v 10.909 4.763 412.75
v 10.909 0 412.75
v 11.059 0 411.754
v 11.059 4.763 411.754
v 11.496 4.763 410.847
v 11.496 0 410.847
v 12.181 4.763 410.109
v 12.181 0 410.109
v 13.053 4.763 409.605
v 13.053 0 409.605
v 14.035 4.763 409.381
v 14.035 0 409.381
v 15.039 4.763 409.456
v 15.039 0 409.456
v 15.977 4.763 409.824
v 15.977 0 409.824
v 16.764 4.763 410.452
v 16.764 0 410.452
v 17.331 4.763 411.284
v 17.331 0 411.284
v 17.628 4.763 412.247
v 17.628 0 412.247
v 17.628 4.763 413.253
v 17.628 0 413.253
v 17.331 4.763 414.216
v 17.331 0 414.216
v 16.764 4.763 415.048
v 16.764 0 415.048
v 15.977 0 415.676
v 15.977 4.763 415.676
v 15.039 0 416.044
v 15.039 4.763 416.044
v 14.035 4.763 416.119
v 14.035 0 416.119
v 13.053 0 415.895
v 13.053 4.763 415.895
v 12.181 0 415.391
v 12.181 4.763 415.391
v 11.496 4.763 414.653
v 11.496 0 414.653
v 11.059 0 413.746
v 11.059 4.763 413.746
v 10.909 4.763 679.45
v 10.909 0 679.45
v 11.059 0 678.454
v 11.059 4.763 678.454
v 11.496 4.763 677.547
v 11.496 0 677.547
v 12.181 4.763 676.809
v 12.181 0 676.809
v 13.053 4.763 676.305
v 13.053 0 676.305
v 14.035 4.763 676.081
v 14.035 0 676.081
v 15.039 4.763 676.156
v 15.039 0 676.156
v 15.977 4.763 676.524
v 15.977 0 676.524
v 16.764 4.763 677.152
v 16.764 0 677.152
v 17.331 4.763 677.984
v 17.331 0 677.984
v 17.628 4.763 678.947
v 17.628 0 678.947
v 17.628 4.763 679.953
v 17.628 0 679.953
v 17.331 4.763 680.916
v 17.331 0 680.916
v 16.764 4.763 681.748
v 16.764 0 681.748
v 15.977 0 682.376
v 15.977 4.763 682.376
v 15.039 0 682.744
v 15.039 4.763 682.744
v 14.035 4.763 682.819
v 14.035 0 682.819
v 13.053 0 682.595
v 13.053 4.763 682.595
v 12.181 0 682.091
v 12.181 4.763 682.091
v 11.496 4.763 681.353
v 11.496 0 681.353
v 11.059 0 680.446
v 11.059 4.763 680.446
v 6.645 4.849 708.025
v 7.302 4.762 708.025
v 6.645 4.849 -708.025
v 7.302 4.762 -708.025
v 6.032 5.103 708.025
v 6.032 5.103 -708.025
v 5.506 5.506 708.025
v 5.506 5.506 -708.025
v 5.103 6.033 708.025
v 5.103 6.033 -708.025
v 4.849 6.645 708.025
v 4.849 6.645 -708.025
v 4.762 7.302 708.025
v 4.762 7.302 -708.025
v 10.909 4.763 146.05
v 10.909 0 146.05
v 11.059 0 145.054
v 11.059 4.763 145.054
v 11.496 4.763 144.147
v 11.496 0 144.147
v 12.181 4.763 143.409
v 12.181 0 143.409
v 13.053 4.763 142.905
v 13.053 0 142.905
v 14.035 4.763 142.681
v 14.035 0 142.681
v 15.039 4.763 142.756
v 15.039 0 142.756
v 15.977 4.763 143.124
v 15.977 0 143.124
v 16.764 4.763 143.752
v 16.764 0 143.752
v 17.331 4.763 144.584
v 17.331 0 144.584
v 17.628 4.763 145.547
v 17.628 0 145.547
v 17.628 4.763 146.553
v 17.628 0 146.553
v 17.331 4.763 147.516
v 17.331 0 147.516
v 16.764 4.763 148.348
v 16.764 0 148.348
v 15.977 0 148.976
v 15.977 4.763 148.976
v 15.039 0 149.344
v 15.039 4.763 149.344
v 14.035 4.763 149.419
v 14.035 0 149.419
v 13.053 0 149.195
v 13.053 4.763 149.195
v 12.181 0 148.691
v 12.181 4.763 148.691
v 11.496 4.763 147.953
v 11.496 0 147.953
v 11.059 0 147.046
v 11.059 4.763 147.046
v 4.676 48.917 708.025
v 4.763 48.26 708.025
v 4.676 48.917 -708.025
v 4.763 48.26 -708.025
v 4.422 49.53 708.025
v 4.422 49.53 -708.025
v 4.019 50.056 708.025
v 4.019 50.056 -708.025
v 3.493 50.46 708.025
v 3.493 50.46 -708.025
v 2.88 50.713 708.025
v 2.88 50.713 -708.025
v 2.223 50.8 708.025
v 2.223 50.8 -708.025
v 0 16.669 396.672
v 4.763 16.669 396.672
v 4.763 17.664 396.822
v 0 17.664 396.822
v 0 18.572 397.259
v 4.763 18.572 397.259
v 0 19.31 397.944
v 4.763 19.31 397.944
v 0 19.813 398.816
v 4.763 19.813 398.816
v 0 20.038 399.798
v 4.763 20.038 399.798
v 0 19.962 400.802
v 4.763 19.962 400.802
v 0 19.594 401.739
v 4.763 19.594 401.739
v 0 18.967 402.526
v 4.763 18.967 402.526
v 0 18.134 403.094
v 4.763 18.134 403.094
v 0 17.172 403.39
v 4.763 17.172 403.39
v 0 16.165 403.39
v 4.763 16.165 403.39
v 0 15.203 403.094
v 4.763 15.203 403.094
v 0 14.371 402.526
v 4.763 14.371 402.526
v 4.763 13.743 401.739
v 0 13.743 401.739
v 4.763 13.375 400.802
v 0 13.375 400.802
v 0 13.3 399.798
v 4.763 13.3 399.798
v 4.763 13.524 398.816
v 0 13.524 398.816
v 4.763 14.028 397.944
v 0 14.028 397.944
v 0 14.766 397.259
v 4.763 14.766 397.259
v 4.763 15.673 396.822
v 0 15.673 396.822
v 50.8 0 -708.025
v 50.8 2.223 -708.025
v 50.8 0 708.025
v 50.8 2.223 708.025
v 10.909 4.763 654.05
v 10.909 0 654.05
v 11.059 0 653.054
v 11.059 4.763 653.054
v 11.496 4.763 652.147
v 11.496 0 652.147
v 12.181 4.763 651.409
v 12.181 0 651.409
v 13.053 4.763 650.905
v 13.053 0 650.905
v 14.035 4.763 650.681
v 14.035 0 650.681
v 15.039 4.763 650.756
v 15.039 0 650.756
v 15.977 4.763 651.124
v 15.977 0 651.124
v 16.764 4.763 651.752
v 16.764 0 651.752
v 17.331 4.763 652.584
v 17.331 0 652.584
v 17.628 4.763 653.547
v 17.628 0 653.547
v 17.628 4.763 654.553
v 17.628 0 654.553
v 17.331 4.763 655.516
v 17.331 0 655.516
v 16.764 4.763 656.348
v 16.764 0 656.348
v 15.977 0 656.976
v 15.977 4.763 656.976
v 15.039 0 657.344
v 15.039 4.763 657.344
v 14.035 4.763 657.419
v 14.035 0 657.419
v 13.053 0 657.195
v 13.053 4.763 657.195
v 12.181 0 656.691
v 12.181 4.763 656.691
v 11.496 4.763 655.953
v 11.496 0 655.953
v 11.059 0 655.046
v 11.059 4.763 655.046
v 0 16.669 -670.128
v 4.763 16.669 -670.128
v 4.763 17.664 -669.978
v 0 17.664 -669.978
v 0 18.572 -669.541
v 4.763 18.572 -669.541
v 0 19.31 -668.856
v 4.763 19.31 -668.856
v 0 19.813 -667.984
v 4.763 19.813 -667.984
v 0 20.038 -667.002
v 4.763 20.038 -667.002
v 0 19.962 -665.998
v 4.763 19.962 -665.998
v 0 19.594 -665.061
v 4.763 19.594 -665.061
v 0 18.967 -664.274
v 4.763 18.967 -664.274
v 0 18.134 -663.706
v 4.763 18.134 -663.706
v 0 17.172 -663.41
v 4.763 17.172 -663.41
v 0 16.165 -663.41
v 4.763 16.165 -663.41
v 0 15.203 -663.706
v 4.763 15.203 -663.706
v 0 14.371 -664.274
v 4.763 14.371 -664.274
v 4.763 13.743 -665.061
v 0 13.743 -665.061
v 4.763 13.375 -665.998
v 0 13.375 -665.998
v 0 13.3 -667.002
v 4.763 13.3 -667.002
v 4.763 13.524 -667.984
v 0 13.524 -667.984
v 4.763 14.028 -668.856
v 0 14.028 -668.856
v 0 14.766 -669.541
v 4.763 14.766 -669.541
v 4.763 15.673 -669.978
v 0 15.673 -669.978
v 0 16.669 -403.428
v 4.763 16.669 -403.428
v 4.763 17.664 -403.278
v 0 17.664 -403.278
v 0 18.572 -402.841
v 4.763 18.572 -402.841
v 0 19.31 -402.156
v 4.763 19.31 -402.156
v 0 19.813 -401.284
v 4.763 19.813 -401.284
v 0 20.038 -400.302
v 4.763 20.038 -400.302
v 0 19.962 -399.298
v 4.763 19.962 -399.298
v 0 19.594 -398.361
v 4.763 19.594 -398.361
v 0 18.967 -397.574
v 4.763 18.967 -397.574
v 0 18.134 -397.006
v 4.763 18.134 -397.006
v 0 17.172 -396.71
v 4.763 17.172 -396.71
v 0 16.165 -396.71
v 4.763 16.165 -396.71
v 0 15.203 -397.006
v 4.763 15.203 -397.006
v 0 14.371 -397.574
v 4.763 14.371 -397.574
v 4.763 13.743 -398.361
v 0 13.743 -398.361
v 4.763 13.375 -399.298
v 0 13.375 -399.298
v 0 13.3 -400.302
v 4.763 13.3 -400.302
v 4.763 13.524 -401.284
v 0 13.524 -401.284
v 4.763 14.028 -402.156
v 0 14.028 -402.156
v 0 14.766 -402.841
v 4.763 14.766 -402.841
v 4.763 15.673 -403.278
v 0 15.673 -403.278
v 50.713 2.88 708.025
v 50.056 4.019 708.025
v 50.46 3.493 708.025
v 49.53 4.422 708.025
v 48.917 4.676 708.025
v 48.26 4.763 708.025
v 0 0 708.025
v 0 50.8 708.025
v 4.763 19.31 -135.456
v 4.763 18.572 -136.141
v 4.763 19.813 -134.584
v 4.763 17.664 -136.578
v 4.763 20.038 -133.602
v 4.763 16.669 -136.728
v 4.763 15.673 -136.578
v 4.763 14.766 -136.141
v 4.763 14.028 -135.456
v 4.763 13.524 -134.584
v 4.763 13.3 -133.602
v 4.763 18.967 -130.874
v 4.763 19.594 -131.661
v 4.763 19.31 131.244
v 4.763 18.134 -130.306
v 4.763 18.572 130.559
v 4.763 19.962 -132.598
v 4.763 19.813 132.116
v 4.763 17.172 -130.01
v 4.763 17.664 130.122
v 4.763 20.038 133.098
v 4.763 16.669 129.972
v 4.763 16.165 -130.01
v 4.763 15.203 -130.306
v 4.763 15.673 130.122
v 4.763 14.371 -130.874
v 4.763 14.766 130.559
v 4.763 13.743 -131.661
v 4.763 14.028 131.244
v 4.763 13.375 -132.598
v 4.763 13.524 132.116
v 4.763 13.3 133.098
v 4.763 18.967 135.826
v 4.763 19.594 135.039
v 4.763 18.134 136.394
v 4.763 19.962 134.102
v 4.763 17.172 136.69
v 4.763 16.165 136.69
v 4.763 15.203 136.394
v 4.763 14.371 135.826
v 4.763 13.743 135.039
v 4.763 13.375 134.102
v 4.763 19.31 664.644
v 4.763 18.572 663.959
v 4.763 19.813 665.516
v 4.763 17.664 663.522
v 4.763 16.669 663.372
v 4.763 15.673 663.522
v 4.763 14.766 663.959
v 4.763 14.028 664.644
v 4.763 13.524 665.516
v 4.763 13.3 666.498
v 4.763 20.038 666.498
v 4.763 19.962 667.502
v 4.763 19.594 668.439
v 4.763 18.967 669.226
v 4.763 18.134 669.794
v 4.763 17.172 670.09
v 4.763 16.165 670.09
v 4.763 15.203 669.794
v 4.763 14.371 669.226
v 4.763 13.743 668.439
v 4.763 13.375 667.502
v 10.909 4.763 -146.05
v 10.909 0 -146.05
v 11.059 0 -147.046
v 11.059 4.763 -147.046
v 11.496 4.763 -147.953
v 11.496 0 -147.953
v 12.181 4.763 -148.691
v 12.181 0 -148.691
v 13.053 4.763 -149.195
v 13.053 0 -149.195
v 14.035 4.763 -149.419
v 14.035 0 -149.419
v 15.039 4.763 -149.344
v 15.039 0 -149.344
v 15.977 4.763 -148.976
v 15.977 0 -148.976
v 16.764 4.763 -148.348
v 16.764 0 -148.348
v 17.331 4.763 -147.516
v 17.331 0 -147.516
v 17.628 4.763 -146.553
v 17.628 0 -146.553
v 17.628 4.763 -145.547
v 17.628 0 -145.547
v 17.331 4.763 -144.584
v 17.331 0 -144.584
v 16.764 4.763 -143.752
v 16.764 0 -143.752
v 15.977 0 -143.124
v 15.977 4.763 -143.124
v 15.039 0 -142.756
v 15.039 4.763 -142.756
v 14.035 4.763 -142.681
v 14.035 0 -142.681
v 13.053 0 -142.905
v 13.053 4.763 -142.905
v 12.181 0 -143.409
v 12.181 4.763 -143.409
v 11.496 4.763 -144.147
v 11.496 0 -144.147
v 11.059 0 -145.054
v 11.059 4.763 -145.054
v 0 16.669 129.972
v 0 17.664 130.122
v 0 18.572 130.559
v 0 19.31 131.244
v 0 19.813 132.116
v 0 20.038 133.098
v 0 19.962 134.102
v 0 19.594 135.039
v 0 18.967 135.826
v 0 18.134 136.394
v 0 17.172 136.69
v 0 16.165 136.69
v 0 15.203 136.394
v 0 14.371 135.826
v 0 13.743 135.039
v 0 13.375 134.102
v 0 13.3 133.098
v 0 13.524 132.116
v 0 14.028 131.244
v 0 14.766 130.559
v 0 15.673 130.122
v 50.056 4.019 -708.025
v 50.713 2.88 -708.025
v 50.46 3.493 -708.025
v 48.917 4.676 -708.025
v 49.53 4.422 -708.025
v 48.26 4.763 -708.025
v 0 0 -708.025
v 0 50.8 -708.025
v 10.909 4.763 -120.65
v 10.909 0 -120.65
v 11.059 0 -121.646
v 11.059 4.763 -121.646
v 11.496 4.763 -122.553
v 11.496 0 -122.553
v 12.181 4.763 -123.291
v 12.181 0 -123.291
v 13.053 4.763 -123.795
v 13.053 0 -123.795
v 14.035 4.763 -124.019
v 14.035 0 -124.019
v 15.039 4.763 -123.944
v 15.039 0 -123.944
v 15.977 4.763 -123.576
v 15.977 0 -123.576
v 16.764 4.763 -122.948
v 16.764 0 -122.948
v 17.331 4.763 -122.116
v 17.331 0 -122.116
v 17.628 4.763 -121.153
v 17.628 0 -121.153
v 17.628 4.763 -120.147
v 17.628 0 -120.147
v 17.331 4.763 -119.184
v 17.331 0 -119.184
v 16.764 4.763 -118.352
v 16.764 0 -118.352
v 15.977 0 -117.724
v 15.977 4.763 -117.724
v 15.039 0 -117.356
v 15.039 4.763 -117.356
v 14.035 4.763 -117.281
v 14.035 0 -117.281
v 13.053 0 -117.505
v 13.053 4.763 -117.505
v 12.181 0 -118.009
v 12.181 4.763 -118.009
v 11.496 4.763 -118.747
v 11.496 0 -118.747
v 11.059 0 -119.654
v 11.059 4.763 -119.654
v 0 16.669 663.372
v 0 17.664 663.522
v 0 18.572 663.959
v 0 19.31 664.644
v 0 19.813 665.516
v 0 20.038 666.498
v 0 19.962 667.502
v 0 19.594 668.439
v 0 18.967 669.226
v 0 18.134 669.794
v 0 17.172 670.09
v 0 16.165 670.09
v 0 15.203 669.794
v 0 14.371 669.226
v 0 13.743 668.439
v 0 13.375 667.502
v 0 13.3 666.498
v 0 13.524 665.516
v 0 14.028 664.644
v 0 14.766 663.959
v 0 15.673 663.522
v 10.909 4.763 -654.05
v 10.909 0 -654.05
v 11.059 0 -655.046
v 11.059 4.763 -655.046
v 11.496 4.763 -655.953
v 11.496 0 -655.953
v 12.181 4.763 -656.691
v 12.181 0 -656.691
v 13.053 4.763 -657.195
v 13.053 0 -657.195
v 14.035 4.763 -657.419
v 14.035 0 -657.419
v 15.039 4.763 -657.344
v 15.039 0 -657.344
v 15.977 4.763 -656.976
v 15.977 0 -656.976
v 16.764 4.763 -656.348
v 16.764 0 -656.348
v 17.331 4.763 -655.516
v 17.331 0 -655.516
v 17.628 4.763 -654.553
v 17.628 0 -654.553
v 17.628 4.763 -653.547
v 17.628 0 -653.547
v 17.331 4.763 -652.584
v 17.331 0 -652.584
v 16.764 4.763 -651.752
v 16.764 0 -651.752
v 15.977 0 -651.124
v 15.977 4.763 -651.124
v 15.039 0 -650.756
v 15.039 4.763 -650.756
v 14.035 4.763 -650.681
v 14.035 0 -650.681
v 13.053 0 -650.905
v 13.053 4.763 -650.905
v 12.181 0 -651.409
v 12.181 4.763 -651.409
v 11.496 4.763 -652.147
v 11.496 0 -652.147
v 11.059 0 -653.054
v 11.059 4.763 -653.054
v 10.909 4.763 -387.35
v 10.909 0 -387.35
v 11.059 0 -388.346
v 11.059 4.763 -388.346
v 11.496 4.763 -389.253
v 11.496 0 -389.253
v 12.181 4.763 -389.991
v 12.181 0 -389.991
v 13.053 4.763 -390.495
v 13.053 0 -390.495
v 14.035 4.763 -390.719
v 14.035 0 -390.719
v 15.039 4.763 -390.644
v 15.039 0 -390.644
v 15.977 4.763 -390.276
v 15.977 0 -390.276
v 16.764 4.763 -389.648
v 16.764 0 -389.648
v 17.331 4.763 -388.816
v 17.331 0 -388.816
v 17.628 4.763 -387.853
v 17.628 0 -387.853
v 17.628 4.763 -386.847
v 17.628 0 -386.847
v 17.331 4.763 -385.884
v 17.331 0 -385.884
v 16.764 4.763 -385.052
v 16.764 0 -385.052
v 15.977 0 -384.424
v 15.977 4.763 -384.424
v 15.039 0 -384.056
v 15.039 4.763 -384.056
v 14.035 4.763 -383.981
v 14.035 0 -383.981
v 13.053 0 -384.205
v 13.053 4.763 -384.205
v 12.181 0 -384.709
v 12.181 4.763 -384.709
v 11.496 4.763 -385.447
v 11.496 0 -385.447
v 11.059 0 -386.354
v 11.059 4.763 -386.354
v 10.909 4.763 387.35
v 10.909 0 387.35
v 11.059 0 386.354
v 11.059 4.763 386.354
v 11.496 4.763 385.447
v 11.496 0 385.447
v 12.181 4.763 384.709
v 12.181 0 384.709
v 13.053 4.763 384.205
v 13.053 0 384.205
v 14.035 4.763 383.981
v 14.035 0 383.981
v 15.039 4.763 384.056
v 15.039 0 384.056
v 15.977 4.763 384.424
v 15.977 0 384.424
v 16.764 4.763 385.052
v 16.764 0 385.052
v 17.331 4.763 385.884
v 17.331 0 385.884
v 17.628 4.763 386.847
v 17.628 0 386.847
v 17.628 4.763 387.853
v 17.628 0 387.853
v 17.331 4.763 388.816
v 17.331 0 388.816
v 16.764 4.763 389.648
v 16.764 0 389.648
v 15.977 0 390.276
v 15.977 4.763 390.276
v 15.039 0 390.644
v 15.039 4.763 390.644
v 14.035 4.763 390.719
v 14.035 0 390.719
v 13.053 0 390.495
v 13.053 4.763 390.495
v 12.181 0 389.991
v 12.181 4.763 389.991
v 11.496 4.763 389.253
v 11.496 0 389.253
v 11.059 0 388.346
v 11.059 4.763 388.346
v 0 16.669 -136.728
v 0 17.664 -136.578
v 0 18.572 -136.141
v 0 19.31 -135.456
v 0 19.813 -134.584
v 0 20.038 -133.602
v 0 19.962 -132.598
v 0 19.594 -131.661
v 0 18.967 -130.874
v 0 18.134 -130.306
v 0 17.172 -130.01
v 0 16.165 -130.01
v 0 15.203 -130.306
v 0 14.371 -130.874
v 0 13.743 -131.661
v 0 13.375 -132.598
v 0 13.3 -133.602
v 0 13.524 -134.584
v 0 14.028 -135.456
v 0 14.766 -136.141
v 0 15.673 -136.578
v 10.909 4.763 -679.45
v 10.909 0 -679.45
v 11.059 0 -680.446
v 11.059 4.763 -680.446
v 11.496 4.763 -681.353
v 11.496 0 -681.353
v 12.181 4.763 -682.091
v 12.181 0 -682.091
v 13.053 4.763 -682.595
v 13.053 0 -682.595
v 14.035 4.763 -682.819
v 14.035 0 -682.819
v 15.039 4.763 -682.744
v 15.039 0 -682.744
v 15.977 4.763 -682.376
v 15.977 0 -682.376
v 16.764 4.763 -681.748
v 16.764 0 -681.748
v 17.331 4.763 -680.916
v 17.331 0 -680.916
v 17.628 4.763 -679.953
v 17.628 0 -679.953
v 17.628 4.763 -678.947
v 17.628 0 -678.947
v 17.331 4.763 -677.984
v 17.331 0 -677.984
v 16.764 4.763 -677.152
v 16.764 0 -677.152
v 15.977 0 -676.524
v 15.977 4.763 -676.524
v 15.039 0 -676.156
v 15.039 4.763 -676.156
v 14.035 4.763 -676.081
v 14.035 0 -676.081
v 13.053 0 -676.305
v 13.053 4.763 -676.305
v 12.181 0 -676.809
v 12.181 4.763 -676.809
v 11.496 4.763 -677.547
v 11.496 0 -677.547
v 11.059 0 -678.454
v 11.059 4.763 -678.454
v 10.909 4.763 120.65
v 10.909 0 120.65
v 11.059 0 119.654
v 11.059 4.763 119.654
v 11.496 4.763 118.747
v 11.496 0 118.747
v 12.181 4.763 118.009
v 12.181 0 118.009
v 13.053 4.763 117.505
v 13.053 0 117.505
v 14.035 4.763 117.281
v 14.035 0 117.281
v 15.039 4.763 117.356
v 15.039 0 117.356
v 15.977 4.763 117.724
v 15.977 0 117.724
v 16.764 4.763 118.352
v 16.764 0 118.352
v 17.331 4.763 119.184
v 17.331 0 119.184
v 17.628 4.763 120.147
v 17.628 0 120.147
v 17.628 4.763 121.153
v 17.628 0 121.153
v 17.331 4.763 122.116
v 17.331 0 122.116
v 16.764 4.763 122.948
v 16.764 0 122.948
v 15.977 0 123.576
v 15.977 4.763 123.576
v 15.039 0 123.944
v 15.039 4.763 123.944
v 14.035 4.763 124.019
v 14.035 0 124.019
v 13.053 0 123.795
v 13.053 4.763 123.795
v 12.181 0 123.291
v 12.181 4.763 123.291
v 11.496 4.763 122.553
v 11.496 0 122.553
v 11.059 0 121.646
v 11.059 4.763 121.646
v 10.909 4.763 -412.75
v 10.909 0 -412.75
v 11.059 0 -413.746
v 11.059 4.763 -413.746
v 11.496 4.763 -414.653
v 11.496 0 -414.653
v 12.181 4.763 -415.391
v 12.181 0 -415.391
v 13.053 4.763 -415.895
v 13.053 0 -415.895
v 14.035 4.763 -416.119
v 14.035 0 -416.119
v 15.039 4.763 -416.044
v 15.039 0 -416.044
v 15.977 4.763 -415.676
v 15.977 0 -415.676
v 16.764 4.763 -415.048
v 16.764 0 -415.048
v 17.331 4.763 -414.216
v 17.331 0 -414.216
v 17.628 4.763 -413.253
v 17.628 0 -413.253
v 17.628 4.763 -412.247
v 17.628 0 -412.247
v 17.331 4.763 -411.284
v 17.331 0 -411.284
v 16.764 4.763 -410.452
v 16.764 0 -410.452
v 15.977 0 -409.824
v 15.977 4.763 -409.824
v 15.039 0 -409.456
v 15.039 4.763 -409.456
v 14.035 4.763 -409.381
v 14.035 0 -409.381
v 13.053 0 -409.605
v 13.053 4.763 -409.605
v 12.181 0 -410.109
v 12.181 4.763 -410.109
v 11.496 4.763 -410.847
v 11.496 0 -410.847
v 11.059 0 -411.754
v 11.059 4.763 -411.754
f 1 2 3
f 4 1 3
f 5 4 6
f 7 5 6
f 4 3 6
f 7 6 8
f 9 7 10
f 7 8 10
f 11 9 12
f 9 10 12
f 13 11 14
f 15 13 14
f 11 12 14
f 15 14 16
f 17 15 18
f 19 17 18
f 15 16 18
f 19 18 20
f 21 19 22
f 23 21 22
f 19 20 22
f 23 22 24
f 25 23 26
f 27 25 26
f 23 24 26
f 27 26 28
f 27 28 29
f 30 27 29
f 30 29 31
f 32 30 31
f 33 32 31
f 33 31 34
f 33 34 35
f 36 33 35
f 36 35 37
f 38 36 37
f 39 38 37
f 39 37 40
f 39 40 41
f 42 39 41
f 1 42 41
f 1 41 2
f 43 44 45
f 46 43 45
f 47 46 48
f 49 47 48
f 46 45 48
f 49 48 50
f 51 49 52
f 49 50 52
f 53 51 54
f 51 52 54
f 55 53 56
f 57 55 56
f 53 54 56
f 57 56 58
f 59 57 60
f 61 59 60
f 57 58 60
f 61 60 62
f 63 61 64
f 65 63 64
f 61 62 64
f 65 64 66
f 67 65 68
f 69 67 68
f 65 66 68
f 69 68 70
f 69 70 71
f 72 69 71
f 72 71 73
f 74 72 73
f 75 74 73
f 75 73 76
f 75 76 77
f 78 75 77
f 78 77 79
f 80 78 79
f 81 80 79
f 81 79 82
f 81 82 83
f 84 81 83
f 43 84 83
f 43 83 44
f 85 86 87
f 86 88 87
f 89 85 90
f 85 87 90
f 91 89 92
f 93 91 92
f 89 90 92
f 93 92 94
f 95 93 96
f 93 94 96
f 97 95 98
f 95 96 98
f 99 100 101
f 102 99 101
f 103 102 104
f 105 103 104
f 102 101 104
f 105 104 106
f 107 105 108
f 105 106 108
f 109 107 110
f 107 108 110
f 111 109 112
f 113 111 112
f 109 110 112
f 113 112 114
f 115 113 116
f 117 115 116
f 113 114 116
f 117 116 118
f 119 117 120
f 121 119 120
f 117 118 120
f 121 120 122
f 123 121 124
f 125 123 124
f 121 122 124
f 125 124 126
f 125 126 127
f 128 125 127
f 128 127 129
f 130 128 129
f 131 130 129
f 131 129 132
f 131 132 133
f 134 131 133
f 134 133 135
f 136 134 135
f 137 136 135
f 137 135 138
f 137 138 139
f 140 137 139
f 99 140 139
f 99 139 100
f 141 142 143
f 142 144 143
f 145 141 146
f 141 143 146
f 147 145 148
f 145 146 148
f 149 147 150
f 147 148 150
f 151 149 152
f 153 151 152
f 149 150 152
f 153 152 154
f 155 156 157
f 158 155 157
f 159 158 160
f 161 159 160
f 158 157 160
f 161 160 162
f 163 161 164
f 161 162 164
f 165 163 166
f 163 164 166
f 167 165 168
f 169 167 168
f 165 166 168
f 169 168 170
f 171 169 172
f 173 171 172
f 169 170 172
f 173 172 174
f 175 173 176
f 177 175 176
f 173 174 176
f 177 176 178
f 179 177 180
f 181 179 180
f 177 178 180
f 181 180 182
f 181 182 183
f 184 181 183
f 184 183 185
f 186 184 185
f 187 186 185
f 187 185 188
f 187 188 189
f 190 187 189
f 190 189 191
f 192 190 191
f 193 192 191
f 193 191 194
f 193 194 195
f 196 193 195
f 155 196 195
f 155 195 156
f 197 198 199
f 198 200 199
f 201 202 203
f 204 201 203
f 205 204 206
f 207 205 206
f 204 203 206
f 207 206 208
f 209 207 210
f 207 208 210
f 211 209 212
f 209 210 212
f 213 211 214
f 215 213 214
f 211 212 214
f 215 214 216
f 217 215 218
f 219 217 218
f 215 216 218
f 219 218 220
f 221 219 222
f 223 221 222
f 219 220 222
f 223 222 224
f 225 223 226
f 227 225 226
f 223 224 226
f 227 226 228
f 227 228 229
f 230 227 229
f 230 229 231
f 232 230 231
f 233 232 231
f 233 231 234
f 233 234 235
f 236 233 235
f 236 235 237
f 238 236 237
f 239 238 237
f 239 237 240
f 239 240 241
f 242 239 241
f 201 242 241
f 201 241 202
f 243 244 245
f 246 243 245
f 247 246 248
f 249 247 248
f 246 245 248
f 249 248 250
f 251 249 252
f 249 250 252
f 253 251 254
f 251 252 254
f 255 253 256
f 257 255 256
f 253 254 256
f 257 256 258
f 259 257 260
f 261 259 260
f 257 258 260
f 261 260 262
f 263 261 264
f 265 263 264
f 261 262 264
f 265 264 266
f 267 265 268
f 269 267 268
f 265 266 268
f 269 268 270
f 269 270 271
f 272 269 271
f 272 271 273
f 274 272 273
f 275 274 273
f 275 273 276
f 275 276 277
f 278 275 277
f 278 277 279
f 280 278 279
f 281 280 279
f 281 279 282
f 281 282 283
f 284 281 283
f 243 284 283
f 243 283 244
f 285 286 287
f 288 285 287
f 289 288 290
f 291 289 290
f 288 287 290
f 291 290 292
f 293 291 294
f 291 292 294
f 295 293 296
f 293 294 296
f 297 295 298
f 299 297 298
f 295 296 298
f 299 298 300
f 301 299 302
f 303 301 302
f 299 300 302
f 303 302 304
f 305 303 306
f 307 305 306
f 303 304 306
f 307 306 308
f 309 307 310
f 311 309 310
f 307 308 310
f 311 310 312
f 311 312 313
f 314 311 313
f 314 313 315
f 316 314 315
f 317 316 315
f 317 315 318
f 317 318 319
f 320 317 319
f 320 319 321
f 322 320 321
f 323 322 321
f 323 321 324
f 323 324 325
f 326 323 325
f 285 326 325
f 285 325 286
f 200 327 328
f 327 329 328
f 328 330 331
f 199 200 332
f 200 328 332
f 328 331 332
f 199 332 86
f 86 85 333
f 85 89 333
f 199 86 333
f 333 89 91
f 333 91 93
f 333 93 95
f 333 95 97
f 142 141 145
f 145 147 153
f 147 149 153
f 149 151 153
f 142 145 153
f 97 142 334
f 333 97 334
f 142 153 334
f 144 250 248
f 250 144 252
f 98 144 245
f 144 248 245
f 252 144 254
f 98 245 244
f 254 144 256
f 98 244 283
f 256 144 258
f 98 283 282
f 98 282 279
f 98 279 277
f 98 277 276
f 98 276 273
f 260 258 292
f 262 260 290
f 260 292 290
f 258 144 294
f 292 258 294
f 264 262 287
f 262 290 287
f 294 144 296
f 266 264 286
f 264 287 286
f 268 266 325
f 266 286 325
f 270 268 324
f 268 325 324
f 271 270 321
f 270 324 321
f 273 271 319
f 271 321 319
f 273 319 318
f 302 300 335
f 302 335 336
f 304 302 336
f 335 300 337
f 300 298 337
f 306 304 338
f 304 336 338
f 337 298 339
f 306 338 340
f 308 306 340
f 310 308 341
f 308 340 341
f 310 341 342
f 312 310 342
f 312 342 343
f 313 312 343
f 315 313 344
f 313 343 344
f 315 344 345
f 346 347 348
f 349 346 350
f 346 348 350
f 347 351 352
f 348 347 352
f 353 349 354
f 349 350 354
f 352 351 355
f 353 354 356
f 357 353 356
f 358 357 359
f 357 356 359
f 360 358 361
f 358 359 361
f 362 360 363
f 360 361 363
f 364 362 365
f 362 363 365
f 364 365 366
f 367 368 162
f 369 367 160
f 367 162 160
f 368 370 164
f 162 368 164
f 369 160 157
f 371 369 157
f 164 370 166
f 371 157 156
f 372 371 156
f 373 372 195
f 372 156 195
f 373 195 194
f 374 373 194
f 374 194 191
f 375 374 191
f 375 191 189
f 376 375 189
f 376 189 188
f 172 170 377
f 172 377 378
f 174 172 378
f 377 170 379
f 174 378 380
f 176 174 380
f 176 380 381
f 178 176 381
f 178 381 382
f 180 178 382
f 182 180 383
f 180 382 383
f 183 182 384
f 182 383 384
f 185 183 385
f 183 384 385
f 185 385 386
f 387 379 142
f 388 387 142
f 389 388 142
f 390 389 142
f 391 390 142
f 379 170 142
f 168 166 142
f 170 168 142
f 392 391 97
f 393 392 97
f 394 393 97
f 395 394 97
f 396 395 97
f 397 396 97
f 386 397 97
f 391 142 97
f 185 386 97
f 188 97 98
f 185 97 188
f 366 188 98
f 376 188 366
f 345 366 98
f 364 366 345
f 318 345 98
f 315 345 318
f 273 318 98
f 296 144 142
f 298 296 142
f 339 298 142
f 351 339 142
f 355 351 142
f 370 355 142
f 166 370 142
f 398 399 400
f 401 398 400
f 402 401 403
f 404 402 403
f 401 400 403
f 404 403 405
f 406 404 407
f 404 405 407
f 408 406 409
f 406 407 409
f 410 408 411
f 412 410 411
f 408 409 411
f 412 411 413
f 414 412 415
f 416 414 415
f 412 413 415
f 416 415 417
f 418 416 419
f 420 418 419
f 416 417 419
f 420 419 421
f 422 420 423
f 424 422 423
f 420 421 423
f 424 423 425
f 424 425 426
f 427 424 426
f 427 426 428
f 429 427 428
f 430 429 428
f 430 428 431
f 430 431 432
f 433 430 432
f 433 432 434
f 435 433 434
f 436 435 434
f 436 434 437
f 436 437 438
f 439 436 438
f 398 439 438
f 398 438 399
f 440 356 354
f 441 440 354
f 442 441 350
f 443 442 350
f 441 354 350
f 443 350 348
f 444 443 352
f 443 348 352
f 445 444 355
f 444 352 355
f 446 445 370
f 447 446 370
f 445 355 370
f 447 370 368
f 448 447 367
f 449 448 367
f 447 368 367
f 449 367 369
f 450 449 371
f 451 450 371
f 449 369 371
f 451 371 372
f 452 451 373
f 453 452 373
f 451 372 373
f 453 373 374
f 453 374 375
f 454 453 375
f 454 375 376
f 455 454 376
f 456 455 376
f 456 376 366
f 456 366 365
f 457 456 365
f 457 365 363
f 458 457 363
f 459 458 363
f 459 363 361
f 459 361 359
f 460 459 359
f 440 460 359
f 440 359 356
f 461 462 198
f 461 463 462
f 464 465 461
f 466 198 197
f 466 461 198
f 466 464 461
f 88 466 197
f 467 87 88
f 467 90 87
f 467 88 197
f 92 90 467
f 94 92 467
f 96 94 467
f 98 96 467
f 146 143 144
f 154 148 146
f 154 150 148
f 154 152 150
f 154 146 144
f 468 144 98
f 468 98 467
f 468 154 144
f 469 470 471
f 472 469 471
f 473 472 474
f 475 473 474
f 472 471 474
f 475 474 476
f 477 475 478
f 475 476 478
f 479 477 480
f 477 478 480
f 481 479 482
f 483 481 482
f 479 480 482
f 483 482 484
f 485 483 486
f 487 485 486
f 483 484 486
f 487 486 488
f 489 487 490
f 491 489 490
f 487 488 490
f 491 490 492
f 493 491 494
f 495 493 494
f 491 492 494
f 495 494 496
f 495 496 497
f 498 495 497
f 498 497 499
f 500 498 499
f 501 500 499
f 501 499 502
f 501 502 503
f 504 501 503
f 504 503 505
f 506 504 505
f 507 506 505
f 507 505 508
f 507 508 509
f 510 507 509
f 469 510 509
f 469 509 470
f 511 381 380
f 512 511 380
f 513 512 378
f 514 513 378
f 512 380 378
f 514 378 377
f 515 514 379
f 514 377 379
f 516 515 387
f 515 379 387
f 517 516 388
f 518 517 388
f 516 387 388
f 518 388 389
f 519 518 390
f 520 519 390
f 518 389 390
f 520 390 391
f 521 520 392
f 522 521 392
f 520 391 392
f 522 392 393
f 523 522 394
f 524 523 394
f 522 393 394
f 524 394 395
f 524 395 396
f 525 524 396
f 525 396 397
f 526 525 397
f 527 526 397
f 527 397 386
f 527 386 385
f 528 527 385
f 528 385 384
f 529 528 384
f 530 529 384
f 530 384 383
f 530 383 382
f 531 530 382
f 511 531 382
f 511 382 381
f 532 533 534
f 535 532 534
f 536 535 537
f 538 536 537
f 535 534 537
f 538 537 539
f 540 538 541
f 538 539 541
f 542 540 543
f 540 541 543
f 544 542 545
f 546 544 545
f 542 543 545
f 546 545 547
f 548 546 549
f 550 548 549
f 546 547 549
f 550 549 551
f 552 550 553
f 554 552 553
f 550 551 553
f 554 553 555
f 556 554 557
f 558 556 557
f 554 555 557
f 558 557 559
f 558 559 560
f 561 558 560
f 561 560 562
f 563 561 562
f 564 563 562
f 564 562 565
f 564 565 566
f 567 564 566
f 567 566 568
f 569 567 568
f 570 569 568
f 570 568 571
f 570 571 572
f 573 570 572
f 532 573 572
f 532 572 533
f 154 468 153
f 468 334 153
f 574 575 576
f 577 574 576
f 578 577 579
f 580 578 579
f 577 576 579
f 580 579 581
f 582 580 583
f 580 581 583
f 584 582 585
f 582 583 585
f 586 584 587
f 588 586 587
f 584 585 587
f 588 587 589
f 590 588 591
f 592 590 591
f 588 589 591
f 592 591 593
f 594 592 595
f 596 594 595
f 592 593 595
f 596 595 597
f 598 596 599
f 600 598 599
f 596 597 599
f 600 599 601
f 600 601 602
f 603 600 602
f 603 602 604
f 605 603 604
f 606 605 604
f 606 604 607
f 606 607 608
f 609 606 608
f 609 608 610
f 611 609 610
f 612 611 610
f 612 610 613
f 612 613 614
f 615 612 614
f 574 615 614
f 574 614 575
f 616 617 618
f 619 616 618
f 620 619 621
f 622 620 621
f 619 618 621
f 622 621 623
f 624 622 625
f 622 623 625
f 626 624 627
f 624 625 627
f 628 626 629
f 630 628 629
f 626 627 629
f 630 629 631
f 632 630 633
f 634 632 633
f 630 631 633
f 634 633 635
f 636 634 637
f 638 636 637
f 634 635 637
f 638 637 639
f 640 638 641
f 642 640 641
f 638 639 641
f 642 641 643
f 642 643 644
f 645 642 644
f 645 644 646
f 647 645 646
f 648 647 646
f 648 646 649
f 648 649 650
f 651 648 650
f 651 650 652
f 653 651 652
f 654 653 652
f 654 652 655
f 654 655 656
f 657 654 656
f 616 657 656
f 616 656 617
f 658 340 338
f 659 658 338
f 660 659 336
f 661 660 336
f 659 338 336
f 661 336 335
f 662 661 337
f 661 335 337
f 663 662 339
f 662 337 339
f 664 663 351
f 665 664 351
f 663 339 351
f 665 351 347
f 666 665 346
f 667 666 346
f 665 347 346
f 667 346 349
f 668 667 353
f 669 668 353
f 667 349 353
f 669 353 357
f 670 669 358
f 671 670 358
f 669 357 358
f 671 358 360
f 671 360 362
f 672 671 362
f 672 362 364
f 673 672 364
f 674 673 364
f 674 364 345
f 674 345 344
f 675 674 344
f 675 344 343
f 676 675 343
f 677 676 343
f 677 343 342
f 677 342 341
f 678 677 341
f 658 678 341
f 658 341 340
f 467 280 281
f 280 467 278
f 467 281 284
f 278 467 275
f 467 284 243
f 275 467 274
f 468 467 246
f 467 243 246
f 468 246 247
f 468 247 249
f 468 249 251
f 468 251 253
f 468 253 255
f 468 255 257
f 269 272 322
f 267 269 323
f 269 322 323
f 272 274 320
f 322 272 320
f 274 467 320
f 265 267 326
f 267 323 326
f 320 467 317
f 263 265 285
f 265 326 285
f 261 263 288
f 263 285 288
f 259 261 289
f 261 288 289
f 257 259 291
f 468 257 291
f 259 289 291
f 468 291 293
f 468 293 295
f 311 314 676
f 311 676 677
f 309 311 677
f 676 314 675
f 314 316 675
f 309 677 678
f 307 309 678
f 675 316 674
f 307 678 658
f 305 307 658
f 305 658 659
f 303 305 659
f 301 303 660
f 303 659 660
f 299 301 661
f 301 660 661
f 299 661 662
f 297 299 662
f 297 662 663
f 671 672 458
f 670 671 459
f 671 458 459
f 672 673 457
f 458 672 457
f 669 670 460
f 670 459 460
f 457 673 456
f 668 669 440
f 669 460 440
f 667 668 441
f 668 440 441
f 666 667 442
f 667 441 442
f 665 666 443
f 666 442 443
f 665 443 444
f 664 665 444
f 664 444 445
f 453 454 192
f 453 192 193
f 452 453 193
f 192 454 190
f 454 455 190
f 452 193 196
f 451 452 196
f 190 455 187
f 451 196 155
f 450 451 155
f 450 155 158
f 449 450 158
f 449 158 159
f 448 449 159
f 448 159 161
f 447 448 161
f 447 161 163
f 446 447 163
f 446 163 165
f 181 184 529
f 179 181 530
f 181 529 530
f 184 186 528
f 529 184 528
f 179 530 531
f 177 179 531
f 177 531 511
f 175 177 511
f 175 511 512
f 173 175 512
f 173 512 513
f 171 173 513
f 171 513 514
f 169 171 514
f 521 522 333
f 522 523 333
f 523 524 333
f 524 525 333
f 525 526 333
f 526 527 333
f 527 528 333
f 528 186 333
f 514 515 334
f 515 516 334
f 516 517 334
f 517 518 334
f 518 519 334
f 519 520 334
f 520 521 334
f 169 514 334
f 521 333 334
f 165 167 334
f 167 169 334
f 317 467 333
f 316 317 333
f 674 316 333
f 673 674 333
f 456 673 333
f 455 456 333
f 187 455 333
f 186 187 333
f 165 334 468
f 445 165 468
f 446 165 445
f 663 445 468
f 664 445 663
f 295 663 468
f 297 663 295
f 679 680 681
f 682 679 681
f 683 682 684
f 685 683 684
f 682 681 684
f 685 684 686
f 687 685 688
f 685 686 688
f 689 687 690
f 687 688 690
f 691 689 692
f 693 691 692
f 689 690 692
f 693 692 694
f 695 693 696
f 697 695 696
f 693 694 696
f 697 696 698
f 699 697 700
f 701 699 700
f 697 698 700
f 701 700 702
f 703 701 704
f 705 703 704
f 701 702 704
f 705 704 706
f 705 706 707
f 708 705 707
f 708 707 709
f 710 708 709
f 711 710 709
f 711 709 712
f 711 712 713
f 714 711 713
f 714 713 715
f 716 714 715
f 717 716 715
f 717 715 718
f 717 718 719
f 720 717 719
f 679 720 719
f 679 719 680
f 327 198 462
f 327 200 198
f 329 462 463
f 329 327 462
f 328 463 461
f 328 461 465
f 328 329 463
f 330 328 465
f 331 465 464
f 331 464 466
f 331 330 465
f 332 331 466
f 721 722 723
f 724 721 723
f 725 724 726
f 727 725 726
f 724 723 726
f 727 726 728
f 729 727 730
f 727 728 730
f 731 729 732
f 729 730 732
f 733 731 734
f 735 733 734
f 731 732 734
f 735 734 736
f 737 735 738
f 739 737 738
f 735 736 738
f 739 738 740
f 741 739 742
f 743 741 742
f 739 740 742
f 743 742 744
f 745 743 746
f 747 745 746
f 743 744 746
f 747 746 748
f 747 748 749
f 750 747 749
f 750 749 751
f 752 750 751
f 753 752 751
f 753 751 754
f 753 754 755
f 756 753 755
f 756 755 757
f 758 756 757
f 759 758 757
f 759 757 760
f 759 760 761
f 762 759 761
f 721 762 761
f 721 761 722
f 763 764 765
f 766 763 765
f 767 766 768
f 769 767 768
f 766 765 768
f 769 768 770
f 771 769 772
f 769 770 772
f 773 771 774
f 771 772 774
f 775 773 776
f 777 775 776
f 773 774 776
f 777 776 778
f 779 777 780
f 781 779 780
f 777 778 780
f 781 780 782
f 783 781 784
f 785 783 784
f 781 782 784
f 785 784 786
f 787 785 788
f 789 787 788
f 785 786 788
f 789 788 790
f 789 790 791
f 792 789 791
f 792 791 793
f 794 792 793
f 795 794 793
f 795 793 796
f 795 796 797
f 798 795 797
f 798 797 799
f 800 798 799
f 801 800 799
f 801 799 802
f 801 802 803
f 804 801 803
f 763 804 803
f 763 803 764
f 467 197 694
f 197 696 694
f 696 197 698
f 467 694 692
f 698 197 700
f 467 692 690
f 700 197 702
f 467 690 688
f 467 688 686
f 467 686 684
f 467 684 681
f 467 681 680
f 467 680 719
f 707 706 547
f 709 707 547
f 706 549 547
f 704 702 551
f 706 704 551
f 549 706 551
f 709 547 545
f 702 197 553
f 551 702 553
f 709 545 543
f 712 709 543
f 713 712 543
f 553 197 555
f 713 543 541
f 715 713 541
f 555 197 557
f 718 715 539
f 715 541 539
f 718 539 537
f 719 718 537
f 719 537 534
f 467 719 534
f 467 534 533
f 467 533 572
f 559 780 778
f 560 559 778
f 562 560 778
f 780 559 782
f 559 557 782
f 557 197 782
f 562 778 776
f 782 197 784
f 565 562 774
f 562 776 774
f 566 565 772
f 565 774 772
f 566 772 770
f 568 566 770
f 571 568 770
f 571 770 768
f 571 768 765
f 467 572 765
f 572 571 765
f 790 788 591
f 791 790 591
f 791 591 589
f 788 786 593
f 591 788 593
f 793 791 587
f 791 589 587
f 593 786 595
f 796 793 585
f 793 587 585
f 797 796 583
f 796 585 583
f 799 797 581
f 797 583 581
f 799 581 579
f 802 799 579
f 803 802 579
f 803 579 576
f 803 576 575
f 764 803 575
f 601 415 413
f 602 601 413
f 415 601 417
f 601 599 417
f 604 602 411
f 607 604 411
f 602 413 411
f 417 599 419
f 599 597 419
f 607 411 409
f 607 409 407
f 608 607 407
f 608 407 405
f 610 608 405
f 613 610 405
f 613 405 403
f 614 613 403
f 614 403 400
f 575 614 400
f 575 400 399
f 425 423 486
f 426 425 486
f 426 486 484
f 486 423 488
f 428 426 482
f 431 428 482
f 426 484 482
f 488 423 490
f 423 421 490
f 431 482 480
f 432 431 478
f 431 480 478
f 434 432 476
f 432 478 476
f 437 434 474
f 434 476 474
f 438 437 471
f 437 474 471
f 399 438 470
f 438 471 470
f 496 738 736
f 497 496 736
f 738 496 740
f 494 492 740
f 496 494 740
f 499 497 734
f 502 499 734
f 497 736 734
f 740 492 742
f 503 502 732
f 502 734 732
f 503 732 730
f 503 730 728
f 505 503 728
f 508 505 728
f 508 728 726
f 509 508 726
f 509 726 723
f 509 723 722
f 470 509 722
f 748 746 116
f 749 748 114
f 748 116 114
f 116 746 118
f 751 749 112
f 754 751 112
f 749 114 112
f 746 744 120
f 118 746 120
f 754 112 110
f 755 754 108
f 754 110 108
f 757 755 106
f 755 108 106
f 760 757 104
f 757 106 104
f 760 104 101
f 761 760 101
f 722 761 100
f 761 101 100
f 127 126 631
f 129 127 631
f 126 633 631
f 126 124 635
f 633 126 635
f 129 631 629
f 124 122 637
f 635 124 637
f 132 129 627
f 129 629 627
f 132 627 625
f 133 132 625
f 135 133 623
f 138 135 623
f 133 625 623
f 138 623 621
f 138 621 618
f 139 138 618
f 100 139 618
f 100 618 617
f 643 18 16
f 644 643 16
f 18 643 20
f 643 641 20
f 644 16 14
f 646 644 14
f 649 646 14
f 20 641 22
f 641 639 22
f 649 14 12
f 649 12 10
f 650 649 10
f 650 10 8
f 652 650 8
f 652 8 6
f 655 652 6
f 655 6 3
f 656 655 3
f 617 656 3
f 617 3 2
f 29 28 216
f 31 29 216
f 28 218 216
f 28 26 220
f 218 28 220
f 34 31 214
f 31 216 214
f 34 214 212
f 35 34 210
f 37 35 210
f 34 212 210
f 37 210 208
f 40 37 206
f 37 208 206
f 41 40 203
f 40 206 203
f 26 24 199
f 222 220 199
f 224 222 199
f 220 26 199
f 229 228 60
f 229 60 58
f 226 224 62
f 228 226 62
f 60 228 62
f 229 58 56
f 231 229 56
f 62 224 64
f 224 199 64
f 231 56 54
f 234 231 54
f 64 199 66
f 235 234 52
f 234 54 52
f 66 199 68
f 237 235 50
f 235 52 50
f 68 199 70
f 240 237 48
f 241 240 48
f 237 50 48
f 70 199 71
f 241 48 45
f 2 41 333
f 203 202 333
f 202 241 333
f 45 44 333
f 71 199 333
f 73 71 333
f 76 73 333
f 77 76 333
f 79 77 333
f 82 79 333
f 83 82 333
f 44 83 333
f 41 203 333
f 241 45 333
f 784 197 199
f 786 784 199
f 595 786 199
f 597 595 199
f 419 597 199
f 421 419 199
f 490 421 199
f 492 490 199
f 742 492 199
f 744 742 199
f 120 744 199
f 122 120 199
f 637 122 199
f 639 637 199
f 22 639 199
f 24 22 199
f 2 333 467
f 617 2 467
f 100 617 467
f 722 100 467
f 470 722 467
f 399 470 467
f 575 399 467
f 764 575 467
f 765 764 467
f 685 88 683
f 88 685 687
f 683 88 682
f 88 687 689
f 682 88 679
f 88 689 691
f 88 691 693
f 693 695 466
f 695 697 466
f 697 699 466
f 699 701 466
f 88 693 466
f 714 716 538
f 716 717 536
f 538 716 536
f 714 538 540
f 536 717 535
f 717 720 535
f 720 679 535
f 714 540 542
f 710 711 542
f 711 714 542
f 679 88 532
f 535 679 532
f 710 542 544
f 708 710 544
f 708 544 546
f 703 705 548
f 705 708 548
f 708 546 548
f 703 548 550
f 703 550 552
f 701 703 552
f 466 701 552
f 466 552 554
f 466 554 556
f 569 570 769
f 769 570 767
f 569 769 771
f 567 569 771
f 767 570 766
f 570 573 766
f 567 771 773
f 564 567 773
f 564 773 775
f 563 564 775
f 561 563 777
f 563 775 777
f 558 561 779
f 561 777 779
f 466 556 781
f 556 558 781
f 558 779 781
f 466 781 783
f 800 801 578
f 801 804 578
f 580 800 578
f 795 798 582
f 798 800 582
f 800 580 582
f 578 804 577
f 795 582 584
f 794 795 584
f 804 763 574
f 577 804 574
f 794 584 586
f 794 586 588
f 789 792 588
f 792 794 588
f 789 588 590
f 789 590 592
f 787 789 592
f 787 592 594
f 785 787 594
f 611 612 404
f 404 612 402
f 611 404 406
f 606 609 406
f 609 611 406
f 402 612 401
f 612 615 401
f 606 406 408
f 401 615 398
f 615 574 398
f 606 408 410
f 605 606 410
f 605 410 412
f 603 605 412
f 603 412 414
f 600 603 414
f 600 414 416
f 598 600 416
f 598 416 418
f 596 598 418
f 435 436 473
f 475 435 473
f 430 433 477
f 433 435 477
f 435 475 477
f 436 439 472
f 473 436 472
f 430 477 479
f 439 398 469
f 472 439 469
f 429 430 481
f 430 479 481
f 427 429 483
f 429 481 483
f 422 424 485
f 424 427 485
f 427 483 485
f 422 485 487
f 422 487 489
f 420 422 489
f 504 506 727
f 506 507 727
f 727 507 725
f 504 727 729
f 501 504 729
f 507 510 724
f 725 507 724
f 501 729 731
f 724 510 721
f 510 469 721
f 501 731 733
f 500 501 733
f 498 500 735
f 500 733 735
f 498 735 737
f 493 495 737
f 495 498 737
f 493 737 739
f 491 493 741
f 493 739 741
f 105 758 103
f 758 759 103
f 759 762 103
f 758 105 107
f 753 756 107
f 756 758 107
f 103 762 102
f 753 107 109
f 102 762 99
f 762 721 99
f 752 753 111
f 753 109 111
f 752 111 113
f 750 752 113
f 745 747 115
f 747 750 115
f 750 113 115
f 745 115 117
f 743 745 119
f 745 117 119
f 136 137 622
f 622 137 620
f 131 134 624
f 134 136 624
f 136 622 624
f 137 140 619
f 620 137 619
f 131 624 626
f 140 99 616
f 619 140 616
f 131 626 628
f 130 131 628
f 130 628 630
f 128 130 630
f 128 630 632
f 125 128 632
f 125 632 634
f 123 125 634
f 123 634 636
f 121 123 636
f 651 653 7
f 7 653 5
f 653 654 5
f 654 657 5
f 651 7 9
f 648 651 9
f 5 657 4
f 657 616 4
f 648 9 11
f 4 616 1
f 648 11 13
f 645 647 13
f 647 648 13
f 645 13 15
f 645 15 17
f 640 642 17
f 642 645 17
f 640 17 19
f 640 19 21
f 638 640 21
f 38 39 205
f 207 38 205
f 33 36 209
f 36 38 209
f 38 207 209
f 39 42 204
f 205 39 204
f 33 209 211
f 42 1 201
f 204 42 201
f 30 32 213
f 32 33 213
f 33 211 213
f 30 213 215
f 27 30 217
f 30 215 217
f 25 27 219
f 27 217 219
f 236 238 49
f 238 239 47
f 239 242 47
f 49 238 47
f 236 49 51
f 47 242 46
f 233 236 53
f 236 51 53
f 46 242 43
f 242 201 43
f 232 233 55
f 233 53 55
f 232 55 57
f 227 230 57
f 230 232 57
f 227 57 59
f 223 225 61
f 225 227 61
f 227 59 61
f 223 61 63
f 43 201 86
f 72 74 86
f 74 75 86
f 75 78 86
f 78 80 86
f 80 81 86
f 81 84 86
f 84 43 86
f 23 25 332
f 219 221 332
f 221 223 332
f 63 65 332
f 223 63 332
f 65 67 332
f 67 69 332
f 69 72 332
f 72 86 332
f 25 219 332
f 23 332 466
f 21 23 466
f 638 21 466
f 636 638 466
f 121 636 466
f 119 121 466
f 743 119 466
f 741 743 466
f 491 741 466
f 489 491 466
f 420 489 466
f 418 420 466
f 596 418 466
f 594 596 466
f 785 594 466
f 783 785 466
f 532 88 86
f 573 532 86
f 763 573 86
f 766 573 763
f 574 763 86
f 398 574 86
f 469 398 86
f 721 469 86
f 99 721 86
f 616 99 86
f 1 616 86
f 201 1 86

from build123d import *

# Parameters (mm, degrees)
BOSS_EXTRUDE1_DEPTH     = 708.025
FILLET1_R               = 2.54
F_1_4_CLEARANCE_HOLE1_D = 6.7564
LPATTERN1_COUNT         = 6
LPATTERN1_PITCH         = 266.7
F_1_4_CLEARANCE_HOLE4_D = 6.7564
LPATTERN4_COUNT         = 6
LPATTERN4_PITCH         = 266.7


with BuildPart() as part:
    # Sketch1 → Boss-Extrude1 (new, symmetric)
    with BuildSketch(Plane.XY):
        Polygon((0, 0), (0, 50.8), (4.7625, 50.8), (4.7625, 4.7625), (50.8, 4.7625), (50.8, 0), align=None)
    extrude(amount=BOSS_EXTRUDE1_DEPTH, both=True)

    # Fillet1
    fillet1_edges = [part.edges().sort_by_distance(p)[0] for p in [
        (4.7625, 50.8, 0),
        (4.7625, 4.7625, 0),
        (50.8, 4.7625, 0),
    ]]
    fillet(fillet1_edges, radius=FILLET1_R)

    # 1/4 Clearance Hole1 (through all)
    with Locations(Plane(origin=(0, 4.7625, 0), x_dir=(1, 0, 0), z_dir=(0, 1, 0))):
        with Locations((14.2875, -679.45), (14.2875, -654.05)):
            f_1_4_clearance_hole1 = Hole(F_1_4_CLEARANCE_HOLE1_D / 2)

    # LPattern1: 1/4 Clearance Hole1 ×6
    with Locations(*[(0, 0, -i * LPATTERN1_PITCH) for i in range(1, LPATTERN1_COUNT)]):
        add(f_1_4_clearance_hole1, mode=Mode.SUBTRACT)

    # 1/4 Clearance Hole4 (through all)
    with Locations(Plane.ZY):
        with Locations((-666.75, 16.66875)):
            f_1_4_clearance_hole4 = Hole(F_1_4_CLEARANCE_HOLE4_D / 2)

    # LPattern4: 1/4 Clearance Hole4 ×6
    with Locations(*[(0, 0, i * LPATTERN4_PITCH) for i in range(1, LPATTERN4_COUNT)]):
        add(f_1_4_clearance_hole4, mode=Mode.SUBTRACT)


solid = part.part
